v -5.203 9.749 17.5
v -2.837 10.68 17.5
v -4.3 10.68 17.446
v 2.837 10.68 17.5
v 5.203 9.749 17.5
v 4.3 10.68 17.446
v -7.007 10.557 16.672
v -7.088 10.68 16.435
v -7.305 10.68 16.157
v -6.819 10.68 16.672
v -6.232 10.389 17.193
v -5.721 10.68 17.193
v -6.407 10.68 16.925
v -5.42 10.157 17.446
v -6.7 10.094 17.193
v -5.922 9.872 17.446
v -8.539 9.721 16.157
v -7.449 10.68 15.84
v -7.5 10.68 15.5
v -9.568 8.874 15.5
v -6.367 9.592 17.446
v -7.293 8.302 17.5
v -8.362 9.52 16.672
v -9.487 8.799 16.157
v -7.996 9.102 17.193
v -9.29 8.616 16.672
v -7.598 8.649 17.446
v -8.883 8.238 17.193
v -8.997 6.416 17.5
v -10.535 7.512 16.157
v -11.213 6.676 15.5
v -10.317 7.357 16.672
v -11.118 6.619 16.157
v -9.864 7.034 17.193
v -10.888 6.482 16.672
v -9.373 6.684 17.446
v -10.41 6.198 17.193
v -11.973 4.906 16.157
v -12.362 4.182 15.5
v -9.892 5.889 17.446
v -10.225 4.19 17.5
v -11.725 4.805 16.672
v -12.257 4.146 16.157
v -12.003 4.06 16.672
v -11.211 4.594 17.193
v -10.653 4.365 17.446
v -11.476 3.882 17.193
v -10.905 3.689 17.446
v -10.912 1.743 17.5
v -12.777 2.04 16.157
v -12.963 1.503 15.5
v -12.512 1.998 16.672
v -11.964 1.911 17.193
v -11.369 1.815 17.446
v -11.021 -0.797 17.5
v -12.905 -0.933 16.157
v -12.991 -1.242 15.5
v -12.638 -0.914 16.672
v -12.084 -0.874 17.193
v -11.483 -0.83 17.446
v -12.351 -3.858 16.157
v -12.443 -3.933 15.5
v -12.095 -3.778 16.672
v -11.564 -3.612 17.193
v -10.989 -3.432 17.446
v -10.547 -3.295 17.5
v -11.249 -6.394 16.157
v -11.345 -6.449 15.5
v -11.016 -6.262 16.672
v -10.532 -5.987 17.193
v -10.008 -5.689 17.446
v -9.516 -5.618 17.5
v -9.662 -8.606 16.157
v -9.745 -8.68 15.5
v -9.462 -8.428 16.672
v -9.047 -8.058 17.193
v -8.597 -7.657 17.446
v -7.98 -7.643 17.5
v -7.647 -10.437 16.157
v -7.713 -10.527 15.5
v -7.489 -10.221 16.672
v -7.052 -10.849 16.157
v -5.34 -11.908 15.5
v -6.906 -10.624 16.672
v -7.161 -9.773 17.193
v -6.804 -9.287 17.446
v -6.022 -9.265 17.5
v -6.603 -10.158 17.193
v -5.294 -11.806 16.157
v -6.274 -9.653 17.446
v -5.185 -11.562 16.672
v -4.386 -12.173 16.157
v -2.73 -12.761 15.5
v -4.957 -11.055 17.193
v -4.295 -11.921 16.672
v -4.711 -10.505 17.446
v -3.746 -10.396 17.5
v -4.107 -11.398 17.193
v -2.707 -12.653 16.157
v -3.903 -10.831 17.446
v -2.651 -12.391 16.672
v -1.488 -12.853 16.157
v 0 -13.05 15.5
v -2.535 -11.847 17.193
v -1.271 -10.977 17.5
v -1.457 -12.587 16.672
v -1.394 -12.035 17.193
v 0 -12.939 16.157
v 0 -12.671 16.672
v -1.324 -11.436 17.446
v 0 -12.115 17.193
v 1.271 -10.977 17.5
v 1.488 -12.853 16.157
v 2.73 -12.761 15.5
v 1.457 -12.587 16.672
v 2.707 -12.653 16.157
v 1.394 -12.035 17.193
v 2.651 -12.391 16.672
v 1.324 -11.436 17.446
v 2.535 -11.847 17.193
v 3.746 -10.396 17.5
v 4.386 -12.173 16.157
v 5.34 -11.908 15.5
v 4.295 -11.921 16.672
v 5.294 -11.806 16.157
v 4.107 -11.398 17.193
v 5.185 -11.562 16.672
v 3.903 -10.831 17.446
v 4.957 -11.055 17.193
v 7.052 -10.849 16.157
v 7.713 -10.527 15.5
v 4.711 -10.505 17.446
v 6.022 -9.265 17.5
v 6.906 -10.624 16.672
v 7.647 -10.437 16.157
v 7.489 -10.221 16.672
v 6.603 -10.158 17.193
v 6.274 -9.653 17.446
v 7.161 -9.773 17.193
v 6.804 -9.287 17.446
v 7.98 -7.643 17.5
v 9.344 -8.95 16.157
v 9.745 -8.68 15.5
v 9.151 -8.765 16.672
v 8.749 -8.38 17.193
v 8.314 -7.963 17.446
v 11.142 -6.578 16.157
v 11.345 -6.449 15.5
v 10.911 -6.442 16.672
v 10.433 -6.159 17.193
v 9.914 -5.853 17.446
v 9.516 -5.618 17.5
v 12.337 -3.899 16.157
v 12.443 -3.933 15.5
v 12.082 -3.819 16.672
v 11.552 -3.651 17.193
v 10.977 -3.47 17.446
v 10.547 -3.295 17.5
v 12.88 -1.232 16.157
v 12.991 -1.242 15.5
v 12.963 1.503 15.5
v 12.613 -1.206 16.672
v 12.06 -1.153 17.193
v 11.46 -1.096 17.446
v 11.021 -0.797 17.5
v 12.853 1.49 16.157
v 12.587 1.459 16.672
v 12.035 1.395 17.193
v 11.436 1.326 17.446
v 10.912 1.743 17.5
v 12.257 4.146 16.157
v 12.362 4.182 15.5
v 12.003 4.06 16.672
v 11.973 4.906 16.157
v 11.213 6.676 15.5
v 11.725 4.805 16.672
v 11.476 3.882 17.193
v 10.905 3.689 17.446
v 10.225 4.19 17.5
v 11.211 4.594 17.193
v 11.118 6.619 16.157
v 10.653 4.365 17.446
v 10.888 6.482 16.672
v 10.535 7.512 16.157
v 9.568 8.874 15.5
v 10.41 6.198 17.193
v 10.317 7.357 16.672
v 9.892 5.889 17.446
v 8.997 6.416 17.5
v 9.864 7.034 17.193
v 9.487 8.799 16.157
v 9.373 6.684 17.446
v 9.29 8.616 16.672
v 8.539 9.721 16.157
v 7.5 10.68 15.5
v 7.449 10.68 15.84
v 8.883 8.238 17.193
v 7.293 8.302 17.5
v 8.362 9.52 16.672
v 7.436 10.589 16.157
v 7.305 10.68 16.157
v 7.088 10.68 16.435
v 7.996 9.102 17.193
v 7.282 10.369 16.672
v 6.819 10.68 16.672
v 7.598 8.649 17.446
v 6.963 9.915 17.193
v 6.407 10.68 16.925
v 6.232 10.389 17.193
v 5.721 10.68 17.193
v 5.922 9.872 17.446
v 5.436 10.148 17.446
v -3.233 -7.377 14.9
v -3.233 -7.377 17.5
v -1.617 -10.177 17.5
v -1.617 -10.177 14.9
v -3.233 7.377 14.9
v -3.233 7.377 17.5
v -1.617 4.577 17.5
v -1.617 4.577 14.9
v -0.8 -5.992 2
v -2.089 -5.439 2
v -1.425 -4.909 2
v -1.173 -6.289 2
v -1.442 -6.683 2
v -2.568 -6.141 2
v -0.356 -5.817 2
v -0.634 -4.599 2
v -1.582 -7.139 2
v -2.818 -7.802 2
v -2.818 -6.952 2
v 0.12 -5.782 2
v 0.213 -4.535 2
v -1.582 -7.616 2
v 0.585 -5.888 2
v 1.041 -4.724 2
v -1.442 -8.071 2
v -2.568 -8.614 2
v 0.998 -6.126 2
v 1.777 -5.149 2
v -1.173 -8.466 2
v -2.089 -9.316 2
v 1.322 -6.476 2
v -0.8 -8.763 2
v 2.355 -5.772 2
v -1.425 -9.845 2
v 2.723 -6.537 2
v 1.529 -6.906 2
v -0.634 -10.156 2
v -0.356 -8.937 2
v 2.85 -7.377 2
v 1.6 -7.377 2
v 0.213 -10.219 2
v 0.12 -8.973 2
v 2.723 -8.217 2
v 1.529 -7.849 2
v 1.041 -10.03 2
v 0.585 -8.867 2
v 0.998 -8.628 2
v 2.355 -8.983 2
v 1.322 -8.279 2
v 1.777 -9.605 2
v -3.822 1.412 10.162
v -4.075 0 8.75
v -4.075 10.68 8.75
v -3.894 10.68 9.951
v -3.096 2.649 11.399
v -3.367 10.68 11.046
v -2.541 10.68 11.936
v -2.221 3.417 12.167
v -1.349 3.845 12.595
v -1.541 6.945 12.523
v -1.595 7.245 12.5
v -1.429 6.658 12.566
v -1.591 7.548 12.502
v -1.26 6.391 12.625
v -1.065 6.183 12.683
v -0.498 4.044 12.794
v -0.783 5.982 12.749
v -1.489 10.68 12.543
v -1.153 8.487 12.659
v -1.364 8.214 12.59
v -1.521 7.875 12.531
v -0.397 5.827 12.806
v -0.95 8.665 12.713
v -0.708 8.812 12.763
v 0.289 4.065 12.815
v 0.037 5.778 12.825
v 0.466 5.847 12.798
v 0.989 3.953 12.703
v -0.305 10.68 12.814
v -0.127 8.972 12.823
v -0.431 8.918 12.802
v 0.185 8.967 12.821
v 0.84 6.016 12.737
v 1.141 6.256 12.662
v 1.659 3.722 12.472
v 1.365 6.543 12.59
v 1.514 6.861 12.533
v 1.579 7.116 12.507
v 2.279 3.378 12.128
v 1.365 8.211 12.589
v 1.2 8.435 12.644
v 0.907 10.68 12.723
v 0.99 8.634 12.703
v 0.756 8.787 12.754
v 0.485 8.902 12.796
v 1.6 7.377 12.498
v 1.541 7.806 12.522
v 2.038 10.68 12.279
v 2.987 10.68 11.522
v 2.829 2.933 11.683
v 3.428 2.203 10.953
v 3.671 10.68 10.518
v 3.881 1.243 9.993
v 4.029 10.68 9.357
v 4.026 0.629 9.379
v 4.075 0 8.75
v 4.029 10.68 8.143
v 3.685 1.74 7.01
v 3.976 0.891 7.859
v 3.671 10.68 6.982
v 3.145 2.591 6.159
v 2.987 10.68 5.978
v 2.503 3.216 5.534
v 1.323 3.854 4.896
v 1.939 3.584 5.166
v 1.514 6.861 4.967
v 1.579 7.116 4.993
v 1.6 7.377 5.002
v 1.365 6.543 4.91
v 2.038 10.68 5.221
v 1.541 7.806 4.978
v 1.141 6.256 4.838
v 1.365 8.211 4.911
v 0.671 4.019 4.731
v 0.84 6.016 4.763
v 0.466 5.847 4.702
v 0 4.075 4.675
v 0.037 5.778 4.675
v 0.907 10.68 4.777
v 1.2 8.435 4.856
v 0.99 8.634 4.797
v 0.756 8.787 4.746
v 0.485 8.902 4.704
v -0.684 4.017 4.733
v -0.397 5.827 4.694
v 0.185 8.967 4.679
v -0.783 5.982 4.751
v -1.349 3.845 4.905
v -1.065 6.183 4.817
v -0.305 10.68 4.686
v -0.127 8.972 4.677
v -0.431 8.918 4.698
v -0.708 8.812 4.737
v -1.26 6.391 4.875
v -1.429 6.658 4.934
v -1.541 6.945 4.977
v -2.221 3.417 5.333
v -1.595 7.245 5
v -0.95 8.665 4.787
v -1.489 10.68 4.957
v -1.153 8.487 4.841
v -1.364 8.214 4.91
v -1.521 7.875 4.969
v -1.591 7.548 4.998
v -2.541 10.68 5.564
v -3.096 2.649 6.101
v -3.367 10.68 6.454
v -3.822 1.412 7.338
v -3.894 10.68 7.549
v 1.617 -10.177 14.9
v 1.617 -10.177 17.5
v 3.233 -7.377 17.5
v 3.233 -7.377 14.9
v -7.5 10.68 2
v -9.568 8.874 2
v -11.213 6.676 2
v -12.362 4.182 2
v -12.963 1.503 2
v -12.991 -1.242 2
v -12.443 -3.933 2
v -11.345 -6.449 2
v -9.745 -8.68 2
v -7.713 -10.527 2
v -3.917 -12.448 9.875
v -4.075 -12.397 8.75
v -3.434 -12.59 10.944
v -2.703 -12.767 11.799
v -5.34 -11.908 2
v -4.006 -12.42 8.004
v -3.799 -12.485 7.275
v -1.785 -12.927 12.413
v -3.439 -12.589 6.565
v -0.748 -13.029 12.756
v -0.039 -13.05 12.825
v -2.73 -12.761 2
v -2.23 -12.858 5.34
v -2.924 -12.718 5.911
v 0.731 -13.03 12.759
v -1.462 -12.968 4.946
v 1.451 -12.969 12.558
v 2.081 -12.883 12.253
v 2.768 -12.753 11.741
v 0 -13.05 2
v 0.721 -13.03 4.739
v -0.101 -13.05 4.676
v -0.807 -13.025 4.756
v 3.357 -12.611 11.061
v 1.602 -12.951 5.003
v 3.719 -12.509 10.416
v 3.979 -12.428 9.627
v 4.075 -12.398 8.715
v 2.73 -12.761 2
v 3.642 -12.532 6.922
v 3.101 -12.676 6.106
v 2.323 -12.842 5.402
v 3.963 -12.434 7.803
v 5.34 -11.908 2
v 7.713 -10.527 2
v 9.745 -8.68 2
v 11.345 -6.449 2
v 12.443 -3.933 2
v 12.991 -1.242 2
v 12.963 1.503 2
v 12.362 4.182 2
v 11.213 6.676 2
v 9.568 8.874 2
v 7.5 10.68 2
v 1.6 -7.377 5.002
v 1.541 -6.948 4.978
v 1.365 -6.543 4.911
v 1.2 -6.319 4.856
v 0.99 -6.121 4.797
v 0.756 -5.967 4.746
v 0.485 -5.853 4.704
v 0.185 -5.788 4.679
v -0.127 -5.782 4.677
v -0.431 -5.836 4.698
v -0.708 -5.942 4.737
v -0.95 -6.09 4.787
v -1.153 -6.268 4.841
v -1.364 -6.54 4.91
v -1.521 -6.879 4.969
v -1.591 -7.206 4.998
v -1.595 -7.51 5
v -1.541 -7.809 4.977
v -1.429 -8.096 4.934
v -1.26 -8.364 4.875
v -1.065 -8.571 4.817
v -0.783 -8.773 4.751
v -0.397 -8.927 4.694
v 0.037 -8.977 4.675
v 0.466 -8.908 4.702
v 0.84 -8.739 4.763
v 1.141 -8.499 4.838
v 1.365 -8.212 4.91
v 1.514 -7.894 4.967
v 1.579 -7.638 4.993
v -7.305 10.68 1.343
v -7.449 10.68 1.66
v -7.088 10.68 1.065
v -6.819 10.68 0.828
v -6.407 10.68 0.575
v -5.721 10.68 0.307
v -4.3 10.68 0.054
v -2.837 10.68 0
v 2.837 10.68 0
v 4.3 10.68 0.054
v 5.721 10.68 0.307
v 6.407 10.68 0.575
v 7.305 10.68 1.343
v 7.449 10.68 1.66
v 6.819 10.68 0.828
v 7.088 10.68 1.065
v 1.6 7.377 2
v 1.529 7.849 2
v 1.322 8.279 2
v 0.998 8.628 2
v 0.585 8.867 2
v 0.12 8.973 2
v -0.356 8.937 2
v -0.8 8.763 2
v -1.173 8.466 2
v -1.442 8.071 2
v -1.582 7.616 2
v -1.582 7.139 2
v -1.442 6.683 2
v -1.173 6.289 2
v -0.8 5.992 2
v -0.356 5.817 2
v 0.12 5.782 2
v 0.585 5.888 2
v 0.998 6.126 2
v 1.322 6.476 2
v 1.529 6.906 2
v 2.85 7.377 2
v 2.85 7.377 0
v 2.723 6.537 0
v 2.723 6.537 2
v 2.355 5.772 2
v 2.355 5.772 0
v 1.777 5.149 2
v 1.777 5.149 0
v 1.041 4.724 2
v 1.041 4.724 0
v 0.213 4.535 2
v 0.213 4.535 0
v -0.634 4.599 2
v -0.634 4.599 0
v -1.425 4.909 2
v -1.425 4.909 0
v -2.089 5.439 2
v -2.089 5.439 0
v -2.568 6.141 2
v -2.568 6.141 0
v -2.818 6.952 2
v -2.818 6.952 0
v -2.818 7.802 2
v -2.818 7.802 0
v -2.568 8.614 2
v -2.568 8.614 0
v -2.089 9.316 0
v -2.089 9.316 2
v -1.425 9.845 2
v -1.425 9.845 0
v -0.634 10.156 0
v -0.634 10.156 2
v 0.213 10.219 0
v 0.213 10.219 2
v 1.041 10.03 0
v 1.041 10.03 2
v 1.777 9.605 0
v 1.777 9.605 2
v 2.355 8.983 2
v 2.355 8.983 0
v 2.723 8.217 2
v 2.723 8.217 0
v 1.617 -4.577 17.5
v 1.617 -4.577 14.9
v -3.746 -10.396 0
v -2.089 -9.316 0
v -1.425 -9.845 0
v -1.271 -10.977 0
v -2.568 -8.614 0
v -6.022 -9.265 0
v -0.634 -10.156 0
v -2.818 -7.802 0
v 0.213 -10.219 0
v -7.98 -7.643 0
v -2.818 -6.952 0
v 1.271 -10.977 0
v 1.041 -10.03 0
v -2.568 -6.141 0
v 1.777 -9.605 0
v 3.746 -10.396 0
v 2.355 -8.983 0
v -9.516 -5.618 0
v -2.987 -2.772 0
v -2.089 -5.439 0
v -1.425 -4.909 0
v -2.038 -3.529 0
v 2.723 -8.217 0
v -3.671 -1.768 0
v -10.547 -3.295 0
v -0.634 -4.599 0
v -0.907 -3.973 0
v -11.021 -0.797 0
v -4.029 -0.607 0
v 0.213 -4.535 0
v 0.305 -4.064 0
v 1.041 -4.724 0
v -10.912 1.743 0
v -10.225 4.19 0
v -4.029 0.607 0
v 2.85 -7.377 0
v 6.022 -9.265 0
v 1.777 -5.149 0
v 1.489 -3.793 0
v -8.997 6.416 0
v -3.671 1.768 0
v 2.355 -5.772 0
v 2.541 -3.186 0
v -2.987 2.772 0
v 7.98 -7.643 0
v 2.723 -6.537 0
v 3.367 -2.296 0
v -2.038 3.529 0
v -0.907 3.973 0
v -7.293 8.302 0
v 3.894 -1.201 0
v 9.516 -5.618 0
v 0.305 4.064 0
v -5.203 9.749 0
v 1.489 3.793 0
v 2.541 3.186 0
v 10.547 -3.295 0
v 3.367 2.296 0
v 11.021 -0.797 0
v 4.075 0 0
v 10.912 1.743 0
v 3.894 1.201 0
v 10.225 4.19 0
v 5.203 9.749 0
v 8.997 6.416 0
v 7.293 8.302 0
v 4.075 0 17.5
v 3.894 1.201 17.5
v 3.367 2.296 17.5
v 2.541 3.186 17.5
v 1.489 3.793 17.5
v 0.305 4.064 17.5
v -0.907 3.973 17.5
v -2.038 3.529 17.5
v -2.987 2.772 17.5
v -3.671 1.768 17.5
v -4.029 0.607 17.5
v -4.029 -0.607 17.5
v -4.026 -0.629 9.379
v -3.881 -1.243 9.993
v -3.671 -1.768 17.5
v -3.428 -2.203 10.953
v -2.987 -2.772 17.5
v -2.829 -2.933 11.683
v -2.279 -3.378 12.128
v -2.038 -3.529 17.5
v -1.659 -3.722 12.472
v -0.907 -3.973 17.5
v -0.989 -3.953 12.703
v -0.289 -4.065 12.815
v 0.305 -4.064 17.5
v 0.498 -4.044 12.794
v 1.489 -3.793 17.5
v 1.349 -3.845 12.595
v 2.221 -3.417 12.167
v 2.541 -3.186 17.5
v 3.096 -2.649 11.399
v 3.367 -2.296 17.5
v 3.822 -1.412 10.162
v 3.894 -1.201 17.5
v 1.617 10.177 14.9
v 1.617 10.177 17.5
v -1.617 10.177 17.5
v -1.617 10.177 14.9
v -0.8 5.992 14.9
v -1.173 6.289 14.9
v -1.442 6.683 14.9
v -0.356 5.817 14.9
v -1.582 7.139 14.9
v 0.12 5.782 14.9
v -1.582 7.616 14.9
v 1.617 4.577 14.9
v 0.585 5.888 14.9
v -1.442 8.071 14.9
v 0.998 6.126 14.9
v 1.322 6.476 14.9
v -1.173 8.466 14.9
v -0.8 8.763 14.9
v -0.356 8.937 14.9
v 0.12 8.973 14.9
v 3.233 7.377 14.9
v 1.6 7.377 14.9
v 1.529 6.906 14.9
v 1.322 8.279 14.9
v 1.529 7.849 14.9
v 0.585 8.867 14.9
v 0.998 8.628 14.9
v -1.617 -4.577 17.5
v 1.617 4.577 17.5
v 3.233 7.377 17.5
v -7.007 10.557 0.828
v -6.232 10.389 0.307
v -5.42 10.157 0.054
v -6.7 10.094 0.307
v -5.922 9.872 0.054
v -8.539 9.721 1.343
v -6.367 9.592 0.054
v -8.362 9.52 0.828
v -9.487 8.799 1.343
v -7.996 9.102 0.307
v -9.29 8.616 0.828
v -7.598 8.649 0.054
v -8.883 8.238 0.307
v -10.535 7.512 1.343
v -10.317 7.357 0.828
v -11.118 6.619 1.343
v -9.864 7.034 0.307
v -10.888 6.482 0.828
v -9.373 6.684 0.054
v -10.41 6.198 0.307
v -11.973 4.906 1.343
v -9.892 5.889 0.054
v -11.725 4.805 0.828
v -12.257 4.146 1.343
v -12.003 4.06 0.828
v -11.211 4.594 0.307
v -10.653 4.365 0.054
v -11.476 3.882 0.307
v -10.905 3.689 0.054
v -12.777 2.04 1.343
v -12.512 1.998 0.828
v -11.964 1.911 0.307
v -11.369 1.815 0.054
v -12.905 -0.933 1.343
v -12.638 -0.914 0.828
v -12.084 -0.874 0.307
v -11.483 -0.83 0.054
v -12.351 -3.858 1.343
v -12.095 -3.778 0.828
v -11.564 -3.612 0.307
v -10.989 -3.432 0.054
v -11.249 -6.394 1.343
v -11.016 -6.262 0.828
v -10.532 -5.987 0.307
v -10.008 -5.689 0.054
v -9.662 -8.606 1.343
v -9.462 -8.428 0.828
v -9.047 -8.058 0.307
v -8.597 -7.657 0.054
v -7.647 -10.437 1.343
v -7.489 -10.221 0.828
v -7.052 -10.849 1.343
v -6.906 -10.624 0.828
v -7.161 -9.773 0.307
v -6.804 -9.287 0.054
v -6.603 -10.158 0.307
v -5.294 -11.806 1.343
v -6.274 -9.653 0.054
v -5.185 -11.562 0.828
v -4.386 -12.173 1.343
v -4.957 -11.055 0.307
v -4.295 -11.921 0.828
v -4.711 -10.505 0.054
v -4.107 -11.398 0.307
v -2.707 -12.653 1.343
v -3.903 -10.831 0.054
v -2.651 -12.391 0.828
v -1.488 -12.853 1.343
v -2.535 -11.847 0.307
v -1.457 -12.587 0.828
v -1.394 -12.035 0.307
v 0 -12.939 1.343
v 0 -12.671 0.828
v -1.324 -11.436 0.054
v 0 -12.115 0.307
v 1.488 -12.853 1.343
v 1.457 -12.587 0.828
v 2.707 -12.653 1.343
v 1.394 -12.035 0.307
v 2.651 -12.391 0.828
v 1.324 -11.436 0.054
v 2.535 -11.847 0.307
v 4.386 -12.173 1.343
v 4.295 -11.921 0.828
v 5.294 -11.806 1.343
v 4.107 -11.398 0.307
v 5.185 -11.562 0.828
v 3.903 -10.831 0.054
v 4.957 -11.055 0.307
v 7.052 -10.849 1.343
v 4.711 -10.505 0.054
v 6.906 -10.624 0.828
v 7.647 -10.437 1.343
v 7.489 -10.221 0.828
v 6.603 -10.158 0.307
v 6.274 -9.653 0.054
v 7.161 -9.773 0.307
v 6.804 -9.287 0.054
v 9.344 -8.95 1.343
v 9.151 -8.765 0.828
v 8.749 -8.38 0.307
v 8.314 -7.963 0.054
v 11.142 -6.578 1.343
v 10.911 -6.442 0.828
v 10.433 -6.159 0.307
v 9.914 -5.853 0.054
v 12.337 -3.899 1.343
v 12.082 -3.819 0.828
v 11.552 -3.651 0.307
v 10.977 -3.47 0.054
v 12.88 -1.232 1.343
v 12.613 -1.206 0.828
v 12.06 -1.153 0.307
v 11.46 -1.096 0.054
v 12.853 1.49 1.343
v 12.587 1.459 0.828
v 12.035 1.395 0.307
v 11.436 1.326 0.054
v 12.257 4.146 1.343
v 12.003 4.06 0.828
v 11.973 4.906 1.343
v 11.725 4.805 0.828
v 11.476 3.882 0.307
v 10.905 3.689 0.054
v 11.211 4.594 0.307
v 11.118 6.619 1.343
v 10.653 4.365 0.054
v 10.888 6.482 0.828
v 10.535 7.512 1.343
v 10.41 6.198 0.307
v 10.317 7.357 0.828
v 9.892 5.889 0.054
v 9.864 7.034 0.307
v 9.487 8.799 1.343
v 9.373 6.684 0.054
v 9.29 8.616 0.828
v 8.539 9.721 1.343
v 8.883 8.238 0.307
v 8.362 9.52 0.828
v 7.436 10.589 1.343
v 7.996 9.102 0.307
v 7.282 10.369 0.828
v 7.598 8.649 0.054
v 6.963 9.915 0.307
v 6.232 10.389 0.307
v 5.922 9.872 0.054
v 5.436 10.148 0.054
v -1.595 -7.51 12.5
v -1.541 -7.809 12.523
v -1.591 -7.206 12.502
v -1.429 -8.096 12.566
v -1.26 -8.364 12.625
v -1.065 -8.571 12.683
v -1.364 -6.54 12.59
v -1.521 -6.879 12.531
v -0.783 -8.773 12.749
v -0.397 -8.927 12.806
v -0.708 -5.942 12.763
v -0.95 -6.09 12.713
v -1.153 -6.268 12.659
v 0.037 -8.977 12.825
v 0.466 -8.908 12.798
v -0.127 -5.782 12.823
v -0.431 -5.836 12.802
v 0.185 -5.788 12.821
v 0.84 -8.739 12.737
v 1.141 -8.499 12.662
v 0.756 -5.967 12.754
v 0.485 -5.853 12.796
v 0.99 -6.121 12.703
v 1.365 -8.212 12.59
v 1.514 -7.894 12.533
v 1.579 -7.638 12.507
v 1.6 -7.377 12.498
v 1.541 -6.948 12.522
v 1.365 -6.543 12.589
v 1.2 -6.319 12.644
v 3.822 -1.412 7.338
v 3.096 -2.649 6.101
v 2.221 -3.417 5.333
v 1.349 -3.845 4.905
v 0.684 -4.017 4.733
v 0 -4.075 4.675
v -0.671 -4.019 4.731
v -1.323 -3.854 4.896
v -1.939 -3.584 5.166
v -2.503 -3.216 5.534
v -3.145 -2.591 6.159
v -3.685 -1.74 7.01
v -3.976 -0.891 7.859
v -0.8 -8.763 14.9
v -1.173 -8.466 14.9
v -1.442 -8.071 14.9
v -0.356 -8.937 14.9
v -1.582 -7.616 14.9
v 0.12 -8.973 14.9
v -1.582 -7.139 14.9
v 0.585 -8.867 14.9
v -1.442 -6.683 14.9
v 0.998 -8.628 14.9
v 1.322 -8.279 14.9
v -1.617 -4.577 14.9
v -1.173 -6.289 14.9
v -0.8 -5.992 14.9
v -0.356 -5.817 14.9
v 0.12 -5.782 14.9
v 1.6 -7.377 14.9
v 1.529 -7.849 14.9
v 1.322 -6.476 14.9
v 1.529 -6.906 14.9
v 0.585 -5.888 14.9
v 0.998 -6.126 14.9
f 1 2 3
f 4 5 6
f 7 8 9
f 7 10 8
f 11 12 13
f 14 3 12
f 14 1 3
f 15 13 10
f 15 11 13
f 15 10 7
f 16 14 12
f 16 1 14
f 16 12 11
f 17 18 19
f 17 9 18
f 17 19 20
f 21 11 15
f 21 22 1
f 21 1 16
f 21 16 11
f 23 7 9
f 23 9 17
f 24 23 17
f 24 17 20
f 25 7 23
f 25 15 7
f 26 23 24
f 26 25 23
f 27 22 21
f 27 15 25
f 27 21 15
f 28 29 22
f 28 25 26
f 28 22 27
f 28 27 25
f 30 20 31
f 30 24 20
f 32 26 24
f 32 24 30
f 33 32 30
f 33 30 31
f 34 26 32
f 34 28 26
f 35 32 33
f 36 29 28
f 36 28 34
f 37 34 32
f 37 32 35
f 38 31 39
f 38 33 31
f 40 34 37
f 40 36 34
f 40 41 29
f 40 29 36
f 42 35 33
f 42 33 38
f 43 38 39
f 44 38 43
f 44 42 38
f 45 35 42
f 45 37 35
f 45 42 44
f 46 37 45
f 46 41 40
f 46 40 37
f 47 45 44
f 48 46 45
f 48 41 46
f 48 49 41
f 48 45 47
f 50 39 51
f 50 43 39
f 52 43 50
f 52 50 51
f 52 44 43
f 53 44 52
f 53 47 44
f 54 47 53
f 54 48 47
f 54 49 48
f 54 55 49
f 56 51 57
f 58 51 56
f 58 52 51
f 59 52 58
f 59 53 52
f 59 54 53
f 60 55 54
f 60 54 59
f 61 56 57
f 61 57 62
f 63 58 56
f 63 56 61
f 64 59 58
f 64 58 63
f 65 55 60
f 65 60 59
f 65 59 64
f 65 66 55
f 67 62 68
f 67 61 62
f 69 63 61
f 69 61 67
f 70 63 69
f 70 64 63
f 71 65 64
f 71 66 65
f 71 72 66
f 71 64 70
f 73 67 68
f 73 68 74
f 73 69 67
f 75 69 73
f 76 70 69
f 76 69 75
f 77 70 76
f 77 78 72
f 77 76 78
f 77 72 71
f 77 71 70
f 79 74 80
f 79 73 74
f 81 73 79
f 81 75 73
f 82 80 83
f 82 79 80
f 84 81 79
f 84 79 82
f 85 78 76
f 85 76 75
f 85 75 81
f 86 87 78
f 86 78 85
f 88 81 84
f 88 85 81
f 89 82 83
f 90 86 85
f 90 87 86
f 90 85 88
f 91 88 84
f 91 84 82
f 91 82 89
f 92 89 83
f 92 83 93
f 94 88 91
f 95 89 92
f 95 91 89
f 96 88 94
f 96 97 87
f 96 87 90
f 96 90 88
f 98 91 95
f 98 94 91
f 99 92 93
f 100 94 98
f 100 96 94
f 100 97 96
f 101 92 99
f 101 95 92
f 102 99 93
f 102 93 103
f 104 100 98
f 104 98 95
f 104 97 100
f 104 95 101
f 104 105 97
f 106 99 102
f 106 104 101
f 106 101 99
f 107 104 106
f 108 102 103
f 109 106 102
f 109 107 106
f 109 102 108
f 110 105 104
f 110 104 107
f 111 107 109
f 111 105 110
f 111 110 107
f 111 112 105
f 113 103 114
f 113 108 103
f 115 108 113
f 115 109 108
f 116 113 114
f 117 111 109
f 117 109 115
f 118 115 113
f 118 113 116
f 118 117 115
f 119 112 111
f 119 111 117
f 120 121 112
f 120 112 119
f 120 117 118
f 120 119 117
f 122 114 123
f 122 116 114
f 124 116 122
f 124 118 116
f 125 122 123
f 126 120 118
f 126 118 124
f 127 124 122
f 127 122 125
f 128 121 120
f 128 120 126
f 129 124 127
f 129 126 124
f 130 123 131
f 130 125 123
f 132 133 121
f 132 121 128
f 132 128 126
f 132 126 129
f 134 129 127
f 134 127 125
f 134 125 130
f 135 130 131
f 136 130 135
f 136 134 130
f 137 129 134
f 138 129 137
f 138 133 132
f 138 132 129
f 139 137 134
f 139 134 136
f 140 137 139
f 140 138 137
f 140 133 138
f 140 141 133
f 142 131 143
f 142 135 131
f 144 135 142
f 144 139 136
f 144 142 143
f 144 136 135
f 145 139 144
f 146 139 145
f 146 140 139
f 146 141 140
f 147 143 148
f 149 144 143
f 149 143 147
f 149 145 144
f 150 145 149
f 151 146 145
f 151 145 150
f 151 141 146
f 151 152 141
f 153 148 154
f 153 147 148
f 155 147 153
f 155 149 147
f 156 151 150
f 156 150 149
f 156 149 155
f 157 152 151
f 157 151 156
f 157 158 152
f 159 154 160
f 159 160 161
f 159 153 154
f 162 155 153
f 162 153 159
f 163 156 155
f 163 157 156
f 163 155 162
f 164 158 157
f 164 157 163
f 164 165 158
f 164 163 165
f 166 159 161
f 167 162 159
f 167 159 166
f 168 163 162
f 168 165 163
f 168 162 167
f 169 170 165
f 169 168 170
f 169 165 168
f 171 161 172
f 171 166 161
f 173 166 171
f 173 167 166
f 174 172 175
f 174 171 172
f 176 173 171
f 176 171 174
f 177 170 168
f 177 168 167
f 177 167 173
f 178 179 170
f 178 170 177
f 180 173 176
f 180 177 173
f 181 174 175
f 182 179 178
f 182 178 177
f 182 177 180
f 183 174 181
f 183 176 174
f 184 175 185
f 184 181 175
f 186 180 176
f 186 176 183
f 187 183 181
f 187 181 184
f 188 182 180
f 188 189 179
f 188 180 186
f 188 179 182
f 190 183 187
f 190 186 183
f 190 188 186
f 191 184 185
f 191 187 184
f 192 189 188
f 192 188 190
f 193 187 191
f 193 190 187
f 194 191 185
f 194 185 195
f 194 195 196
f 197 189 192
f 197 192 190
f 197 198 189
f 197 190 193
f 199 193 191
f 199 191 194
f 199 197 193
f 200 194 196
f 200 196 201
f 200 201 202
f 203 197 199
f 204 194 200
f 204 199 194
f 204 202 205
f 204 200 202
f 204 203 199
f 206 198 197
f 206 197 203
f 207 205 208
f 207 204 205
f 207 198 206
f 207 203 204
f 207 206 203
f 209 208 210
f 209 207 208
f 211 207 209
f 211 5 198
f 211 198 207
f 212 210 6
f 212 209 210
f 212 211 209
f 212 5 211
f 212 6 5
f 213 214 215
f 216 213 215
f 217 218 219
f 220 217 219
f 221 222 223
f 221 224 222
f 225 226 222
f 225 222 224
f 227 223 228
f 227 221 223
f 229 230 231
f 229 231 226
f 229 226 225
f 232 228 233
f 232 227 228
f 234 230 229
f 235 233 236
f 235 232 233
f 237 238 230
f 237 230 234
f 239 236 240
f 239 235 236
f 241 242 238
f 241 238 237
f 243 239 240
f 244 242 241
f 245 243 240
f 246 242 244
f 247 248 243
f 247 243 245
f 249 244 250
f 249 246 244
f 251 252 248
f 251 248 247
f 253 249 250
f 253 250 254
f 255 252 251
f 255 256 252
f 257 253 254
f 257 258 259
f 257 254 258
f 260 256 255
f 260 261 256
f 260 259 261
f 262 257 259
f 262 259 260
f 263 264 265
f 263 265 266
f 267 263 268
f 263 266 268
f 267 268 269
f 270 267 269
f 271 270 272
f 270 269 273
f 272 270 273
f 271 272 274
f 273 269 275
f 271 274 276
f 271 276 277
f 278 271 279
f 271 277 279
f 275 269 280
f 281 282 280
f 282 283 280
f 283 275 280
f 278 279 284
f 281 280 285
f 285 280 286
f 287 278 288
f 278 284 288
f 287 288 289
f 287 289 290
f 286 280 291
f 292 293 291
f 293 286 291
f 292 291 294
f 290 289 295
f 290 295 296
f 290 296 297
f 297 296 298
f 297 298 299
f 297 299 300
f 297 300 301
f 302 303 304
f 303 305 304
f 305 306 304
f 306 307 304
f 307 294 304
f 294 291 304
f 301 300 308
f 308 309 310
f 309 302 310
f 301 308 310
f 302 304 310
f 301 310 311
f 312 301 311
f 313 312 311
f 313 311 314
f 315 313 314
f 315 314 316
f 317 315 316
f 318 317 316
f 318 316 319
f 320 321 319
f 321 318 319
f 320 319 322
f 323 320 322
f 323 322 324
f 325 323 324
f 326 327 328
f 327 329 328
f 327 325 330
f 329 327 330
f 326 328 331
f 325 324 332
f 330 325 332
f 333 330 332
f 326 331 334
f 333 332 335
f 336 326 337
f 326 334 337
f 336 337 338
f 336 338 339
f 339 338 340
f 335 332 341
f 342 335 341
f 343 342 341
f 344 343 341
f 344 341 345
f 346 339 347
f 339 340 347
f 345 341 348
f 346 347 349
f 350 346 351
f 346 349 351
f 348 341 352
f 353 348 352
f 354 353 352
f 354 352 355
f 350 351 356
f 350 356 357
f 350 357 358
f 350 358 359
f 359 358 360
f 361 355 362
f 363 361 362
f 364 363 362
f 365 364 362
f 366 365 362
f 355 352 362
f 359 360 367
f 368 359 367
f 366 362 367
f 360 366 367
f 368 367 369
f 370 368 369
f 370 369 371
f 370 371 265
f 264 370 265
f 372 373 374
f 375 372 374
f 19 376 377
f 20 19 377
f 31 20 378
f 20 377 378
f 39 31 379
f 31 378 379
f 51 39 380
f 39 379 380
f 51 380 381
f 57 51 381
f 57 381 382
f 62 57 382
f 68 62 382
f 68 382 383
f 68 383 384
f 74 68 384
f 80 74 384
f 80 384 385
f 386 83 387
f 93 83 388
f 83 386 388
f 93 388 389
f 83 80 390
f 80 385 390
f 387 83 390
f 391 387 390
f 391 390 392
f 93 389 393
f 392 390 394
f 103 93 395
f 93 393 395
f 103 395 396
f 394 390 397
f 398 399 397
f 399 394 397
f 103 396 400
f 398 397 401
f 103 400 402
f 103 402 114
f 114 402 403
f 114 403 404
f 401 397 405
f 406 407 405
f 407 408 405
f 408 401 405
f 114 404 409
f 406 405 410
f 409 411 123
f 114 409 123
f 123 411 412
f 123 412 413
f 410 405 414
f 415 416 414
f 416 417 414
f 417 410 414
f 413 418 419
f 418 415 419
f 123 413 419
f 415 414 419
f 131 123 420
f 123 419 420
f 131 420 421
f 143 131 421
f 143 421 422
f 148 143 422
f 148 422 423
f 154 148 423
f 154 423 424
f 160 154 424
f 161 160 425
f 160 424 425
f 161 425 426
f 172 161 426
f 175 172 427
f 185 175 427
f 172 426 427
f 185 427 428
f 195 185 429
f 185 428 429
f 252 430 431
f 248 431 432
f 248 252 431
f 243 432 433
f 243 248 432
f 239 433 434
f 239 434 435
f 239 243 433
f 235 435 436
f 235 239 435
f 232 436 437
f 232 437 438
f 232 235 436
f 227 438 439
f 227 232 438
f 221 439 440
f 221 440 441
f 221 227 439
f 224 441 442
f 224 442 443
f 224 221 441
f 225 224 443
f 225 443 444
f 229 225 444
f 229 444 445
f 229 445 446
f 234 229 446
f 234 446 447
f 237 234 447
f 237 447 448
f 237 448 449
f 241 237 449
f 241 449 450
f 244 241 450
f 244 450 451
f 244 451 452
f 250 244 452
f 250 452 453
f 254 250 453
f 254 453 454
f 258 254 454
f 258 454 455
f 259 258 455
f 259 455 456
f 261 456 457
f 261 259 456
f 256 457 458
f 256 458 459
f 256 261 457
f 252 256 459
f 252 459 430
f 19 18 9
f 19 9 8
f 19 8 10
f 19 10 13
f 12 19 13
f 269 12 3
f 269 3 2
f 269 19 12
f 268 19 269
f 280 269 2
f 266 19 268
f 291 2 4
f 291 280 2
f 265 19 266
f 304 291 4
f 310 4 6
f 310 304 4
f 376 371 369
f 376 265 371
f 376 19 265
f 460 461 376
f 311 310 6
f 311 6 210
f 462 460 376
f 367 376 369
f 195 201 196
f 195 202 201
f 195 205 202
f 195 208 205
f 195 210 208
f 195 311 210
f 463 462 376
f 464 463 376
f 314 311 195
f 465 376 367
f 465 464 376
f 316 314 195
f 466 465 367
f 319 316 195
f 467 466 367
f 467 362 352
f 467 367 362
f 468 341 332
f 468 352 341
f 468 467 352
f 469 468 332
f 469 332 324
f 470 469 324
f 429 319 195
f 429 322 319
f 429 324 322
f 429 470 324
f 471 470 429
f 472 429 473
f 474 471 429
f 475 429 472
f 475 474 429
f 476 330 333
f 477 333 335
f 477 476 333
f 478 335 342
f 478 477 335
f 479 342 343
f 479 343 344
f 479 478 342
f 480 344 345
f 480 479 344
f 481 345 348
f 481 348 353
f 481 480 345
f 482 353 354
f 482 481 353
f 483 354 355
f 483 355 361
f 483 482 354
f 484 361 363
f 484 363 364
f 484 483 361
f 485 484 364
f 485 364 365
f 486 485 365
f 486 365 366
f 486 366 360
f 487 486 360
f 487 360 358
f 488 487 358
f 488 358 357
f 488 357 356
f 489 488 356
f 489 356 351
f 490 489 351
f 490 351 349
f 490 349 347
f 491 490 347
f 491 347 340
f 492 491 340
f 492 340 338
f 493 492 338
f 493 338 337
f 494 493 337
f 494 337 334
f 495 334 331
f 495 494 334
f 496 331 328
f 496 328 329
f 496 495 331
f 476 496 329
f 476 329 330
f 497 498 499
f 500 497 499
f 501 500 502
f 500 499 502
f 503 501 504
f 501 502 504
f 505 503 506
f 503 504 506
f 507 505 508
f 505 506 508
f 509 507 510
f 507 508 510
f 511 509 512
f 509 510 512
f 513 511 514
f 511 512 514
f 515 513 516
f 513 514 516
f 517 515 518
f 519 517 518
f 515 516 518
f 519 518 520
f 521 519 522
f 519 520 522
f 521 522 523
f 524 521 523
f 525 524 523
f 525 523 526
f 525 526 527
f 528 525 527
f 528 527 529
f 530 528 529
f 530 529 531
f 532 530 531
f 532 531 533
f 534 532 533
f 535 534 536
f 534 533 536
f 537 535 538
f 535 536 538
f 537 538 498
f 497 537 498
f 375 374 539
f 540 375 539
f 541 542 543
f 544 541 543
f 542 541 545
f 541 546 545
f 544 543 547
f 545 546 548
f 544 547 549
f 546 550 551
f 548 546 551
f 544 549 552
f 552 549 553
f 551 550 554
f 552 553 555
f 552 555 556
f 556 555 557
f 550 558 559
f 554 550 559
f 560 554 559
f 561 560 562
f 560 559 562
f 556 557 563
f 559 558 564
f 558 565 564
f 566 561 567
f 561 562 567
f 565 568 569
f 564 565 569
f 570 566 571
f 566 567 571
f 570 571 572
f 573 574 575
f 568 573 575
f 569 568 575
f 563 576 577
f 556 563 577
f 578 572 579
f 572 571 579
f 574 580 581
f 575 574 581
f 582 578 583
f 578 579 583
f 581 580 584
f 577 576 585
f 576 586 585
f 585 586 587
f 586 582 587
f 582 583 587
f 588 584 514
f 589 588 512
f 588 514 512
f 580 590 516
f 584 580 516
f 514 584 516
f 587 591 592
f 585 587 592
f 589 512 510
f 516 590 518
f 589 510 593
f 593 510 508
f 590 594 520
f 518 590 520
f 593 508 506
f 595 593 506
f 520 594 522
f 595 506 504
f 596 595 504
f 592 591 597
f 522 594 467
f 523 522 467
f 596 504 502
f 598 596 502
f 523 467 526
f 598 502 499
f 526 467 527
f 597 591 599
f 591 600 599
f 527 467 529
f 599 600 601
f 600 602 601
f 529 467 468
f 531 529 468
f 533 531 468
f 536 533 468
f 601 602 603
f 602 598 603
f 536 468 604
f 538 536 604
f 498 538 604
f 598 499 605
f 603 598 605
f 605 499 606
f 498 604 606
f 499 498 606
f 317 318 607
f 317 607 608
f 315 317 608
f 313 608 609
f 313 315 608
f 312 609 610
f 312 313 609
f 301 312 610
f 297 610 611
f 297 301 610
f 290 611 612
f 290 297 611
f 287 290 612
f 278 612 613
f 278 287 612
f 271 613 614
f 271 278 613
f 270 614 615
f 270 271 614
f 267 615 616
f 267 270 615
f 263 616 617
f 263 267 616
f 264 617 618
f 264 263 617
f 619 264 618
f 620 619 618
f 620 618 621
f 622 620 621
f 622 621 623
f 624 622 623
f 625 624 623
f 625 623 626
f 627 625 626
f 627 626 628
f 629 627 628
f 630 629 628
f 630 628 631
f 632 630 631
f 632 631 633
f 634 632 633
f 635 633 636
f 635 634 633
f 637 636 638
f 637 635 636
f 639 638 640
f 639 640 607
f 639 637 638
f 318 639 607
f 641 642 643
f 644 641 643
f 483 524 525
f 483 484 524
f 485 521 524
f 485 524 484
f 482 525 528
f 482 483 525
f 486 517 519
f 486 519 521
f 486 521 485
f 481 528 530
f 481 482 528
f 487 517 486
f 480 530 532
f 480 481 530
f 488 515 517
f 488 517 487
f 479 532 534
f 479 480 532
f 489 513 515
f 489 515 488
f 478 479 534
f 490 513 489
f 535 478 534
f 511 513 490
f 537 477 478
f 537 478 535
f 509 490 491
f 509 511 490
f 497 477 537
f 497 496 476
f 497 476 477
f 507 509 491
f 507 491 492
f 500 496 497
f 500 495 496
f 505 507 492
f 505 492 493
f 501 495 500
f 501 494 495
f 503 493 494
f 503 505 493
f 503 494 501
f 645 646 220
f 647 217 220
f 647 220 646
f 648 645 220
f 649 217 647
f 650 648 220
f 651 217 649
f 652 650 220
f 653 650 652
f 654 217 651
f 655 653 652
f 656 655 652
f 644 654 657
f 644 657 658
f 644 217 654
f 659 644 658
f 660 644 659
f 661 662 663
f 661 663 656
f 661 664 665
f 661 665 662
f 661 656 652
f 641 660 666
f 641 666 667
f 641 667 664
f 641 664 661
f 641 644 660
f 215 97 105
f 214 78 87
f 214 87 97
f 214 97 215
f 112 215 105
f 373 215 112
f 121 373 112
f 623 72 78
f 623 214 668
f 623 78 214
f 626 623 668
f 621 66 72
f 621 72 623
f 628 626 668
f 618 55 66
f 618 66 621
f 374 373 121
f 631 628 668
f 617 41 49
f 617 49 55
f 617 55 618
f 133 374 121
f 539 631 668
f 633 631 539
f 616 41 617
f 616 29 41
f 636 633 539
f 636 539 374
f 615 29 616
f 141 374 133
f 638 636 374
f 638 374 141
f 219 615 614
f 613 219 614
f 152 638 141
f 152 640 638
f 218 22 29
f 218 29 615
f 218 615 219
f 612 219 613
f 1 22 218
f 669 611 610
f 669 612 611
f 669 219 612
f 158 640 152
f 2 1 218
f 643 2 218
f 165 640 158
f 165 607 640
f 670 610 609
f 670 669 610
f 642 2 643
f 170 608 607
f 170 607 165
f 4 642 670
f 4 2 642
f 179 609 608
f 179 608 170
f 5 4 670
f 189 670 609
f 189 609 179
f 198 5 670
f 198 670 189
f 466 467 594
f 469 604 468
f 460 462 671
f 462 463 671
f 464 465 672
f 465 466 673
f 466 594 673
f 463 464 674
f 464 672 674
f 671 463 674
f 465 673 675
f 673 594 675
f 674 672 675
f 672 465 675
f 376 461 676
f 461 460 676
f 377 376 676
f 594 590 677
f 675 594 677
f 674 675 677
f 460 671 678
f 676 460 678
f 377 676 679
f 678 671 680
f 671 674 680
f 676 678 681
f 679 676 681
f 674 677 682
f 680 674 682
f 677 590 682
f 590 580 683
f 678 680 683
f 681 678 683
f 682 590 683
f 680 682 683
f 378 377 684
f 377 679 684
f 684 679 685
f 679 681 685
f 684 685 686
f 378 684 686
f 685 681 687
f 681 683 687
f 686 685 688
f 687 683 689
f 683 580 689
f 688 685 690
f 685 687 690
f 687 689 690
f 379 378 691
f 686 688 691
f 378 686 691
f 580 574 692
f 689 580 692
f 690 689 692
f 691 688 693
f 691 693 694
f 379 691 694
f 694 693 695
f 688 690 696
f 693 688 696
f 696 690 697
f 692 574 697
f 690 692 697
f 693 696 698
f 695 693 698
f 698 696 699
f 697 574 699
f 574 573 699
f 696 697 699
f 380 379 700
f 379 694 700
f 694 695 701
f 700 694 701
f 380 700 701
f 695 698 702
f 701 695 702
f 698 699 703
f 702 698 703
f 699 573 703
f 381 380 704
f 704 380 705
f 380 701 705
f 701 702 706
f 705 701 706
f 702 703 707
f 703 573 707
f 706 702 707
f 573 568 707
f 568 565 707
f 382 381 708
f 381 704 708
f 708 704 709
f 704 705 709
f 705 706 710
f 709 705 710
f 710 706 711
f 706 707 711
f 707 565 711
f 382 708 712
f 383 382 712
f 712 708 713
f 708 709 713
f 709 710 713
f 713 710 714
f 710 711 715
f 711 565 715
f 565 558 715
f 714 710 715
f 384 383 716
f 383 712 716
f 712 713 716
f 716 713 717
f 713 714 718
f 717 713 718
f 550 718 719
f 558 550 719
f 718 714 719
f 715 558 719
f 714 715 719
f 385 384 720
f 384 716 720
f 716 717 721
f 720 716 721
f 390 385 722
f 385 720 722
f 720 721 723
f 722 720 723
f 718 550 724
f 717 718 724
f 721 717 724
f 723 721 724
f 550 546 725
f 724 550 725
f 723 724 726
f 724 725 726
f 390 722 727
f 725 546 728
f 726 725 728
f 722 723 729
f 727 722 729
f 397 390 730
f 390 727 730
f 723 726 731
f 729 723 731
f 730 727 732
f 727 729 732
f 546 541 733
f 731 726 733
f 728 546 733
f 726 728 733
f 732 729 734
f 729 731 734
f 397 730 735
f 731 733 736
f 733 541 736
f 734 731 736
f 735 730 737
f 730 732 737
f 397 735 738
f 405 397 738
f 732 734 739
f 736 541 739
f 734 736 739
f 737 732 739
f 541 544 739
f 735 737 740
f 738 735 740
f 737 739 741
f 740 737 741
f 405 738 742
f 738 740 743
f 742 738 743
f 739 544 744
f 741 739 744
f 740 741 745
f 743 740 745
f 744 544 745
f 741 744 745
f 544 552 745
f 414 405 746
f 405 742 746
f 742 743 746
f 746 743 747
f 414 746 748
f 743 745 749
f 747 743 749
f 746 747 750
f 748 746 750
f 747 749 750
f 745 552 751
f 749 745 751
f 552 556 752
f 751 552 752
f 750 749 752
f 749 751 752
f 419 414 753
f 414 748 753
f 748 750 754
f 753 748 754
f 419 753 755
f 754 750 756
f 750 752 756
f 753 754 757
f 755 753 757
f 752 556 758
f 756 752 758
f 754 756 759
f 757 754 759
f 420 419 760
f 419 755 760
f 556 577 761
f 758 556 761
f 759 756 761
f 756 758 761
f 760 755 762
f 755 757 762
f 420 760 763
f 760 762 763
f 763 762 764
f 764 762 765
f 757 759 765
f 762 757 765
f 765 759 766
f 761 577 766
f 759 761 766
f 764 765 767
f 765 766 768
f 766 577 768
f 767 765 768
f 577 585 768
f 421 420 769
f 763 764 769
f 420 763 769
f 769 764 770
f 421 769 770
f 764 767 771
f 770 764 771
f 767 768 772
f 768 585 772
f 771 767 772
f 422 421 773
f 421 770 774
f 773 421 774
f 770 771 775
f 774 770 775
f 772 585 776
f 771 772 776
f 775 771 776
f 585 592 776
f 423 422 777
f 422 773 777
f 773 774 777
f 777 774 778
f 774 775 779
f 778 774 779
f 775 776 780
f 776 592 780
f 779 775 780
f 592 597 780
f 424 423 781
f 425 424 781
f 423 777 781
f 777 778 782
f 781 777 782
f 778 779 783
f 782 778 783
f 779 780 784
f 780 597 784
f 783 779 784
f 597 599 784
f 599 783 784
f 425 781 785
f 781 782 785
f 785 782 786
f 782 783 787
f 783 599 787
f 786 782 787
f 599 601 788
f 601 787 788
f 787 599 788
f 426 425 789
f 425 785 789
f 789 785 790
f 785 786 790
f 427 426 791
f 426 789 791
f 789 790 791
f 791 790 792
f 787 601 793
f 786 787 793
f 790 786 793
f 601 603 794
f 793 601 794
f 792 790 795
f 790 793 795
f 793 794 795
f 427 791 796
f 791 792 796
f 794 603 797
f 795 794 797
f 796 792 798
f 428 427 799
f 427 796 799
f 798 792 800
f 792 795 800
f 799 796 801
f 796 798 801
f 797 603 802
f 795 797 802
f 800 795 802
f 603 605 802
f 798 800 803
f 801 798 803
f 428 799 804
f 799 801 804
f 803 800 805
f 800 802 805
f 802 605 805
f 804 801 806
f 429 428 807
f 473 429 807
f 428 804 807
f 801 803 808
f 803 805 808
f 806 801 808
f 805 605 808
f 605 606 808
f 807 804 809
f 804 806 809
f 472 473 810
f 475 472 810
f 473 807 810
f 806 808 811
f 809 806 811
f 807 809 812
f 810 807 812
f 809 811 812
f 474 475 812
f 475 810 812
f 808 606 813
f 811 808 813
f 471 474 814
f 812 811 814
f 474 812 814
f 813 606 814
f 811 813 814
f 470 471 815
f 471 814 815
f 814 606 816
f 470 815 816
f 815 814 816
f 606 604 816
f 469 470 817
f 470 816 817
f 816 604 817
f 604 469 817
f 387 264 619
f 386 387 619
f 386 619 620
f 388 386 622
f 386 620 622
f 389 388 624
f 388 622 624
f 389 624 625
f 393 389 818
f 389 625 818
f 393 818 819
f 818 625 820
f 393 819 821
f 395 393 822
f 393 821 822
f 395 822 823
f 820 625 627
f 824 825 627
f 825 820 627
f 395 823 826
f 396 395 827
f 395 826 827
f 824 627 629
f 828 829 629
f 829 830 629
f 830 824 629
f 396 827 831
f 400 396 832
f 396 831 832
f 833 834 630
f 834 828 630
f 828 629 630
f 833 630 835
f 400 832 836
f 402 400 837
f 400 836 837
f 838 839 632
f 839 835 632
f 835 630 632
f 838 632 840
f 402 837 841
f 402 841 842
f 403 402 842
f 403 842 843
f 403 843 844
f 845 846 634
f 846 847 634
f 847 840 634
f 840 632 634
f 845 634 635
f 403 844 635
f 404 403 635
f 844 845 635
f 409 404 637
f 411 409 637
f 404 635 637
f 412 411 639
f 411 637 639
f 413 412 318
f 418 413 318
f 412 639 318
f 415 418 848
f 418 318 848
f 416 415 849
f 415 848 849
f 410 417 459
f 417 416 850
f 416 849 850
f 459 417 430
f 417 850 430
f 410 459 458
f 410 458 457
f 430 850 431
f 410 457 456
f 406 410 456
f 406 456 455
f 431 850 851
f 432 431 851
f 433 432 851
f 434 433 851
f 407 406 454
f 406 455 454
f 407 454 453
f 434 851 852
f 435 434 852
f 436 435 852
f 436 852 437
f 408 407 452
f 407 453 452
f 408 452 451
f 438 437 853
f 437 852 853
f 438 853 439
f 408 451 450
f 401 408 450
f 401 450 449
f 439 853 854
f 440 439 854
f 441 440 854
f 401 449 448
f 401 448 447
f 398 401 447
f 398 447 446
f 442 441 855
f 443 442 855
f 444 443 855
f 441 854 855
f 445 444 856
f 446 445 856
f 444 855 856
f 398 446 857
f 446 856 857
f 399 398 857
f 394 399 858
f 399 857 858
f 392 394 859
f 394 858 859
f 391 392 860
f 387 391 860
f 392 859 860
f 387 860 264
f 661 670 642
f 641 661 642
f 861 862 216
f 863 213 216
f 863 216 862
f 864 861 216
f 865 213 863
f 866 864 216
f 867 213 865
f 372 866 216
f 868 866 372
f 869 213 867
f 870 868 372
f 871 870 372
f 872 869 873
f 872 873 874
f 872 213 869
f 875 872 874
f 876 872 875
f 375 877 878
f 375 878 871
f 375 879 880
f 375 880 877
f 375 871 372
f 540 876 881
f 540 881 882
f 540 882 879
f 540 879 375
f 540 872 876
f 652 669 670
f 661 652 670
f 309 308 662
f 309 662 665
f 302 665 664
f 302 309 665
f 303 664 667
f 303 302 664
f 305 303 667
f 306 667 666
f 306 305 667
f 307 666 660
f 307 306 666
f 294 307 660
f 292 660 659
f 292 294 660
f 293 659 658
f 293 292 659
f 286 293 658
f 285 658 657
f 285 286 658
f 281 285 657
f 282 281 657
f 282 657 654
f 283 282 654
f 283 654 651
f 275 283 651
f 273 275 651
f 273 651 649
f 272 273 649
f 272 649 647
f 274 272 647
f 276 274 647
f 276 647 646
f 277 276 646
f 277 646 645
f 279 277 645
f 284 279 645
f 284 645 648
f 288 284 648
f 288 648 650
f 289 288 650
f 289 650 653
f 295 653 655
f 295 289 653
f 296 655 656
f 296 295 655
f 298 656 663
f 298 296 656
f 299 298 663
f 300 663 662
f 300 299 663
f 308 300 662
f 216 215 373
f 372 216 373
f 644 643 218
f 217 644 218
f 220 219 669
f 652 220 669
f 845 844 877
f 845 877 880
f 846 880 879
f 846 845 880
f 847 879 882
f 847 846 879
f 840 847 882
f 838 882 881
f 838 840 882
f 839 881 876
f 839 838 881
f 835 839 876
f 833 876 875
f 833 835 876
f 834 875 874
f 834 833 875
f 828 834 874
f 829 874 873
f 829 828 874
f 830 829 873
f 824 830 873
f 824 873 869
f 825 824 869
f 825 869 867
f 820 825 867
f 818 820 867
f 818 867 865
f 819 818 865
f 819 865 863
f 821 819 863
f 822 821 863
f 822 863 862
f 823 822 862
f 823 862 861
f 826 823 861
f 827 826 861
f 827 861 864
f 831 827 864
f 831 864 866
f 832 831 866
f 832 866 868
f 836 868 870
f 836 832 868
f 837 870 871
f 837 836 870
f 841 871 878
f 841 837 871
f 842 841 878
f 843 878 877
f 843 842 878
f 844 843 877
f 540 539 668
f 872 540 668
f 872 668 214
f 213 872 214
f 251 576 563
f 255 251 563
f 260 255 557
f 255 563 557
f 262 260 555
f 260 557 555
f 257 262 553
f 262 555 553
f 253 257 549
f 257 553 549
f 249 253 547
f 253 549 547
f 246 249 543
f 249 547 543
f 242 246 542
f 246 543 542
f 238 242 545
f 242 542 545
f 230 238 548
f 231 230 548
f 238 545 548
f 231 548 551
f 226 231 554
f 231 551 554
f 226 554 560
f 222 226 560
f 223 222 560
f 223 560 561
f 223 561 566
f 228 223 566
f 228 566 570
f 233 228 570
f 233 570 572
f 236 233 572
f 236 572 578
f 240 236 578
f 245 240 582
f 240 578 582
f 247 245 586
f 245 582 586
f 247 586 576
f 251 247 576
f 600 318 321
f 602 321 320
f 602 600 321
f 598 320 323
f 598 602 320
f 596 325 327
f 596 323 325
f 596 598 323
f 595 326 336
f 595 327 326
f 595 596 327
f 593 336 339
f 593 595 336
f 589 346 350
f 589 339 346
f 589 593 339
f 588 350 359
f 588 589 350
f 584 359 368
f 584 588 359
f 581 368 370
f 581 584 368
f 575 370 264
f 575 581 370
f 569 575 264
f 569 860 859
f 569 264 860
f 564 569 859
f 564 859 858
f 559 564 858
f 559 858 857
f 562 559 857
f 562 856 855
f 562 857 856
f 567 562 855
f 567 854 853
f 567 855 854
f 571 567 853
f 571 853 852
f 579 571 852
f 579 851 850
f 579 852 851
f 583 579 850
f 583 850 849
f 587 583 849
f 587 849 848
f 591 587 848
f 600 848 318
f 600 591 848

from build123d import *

# Parameters (mm, degrees)
SKETCH_R        = 1.6
SKETCH_R_2      = 4.075
PAD_DEPTH       = 17.5
SKETCH001_R     = 4.075
POCKET_DEPTH    = 23.730537
SKETCH002_R     = 2.85
POCKET001_DEPTH = 2
POCKET002_DEPTH = 2.6
FILLET_R        = 2


with BuildPart() as part:
    # Sketch → Pad (new body)
    with BuildSketch(Plane.XY):
        with BuildLine():
            ThreePointArc((-7.5, 10.679537), (0, -13.05), (7.5, 10.679537))
            Line((-7.5, 10.679537), (7.5, 10.679537))
        make_face()
        with Locations((0, 7.377268)):
            Circle(SKETCH_R, mode=Mode.SUBTRACT)
        with Locations((0, -7.377268)):
            Circle(SKETCH_R, mode=Mode.SUBTRACT)
        Circle(SKETCH_R_2, mode=Mode.SUBTRACT)
    extrude(amount=PAD_DEPTH)

    # Sketch001 (on Face2 of Pad) → Pocket (cut, through all)
    with BuildSketch(Plane(origin=(0, 10.679537, 0), x_dir=(-1, 0, 0), z_dir=(0, 1, 0))):
        with Locations((0, 8.75)):
            Circle(SKETCH001_R)
    extrude(amount=-POCKET_DEPTH, mode=Mode.SUBTRACT)

    # Sketch002 (on Face3 of Pocket) → Pocket001 (cut)
    with BuildSketch(Plane(origin=(0, 0, 0), x_dir=(1, 0, 0), z_dir=(0, 0, -1))):
        with Locations((0, 7.377268)):
            Circle(SKETCH002_R)
        with Locations((0, -7.377268)):
            Circle(SKETCH002_R)
    extrude(amount=-POCKET001_DEPTH, mode=Mode.SUBTRACT)

    # Sketch003 (on Face4 of Pocket001) → Pocket002 (cut)
    with BuildSketch(Plane.XY.offset(17.5)):
        Polygon((1.616581, 10.177268), (-1.616581, 10.177268), (-3.233162, 7.377268), (-1.616581, 4.577268), (1.616581, 4.577268), (3.233162, 7.377268), align=None)
        Polygon((3.233162, -7.377268), (1.616581, -4.577268), (-1.616581, -4.577268), (-3.233162, -7.377268), (-1.616581, -10.177268), (1.616581, -10.177268), align=None)
    extrude(amount=-POCKET002_DEPTH, mode=Mode.SUBTRACT)

    # Fillet
    fillet_edges = [part.edges().sort_by_distance(p)[0] for p in [
        (0, -13.05, 0),
        (0, -13.05, 17.5),
    ]]
    fillet(fillet_edges, radius=FILLET_R)


solid = part.part
